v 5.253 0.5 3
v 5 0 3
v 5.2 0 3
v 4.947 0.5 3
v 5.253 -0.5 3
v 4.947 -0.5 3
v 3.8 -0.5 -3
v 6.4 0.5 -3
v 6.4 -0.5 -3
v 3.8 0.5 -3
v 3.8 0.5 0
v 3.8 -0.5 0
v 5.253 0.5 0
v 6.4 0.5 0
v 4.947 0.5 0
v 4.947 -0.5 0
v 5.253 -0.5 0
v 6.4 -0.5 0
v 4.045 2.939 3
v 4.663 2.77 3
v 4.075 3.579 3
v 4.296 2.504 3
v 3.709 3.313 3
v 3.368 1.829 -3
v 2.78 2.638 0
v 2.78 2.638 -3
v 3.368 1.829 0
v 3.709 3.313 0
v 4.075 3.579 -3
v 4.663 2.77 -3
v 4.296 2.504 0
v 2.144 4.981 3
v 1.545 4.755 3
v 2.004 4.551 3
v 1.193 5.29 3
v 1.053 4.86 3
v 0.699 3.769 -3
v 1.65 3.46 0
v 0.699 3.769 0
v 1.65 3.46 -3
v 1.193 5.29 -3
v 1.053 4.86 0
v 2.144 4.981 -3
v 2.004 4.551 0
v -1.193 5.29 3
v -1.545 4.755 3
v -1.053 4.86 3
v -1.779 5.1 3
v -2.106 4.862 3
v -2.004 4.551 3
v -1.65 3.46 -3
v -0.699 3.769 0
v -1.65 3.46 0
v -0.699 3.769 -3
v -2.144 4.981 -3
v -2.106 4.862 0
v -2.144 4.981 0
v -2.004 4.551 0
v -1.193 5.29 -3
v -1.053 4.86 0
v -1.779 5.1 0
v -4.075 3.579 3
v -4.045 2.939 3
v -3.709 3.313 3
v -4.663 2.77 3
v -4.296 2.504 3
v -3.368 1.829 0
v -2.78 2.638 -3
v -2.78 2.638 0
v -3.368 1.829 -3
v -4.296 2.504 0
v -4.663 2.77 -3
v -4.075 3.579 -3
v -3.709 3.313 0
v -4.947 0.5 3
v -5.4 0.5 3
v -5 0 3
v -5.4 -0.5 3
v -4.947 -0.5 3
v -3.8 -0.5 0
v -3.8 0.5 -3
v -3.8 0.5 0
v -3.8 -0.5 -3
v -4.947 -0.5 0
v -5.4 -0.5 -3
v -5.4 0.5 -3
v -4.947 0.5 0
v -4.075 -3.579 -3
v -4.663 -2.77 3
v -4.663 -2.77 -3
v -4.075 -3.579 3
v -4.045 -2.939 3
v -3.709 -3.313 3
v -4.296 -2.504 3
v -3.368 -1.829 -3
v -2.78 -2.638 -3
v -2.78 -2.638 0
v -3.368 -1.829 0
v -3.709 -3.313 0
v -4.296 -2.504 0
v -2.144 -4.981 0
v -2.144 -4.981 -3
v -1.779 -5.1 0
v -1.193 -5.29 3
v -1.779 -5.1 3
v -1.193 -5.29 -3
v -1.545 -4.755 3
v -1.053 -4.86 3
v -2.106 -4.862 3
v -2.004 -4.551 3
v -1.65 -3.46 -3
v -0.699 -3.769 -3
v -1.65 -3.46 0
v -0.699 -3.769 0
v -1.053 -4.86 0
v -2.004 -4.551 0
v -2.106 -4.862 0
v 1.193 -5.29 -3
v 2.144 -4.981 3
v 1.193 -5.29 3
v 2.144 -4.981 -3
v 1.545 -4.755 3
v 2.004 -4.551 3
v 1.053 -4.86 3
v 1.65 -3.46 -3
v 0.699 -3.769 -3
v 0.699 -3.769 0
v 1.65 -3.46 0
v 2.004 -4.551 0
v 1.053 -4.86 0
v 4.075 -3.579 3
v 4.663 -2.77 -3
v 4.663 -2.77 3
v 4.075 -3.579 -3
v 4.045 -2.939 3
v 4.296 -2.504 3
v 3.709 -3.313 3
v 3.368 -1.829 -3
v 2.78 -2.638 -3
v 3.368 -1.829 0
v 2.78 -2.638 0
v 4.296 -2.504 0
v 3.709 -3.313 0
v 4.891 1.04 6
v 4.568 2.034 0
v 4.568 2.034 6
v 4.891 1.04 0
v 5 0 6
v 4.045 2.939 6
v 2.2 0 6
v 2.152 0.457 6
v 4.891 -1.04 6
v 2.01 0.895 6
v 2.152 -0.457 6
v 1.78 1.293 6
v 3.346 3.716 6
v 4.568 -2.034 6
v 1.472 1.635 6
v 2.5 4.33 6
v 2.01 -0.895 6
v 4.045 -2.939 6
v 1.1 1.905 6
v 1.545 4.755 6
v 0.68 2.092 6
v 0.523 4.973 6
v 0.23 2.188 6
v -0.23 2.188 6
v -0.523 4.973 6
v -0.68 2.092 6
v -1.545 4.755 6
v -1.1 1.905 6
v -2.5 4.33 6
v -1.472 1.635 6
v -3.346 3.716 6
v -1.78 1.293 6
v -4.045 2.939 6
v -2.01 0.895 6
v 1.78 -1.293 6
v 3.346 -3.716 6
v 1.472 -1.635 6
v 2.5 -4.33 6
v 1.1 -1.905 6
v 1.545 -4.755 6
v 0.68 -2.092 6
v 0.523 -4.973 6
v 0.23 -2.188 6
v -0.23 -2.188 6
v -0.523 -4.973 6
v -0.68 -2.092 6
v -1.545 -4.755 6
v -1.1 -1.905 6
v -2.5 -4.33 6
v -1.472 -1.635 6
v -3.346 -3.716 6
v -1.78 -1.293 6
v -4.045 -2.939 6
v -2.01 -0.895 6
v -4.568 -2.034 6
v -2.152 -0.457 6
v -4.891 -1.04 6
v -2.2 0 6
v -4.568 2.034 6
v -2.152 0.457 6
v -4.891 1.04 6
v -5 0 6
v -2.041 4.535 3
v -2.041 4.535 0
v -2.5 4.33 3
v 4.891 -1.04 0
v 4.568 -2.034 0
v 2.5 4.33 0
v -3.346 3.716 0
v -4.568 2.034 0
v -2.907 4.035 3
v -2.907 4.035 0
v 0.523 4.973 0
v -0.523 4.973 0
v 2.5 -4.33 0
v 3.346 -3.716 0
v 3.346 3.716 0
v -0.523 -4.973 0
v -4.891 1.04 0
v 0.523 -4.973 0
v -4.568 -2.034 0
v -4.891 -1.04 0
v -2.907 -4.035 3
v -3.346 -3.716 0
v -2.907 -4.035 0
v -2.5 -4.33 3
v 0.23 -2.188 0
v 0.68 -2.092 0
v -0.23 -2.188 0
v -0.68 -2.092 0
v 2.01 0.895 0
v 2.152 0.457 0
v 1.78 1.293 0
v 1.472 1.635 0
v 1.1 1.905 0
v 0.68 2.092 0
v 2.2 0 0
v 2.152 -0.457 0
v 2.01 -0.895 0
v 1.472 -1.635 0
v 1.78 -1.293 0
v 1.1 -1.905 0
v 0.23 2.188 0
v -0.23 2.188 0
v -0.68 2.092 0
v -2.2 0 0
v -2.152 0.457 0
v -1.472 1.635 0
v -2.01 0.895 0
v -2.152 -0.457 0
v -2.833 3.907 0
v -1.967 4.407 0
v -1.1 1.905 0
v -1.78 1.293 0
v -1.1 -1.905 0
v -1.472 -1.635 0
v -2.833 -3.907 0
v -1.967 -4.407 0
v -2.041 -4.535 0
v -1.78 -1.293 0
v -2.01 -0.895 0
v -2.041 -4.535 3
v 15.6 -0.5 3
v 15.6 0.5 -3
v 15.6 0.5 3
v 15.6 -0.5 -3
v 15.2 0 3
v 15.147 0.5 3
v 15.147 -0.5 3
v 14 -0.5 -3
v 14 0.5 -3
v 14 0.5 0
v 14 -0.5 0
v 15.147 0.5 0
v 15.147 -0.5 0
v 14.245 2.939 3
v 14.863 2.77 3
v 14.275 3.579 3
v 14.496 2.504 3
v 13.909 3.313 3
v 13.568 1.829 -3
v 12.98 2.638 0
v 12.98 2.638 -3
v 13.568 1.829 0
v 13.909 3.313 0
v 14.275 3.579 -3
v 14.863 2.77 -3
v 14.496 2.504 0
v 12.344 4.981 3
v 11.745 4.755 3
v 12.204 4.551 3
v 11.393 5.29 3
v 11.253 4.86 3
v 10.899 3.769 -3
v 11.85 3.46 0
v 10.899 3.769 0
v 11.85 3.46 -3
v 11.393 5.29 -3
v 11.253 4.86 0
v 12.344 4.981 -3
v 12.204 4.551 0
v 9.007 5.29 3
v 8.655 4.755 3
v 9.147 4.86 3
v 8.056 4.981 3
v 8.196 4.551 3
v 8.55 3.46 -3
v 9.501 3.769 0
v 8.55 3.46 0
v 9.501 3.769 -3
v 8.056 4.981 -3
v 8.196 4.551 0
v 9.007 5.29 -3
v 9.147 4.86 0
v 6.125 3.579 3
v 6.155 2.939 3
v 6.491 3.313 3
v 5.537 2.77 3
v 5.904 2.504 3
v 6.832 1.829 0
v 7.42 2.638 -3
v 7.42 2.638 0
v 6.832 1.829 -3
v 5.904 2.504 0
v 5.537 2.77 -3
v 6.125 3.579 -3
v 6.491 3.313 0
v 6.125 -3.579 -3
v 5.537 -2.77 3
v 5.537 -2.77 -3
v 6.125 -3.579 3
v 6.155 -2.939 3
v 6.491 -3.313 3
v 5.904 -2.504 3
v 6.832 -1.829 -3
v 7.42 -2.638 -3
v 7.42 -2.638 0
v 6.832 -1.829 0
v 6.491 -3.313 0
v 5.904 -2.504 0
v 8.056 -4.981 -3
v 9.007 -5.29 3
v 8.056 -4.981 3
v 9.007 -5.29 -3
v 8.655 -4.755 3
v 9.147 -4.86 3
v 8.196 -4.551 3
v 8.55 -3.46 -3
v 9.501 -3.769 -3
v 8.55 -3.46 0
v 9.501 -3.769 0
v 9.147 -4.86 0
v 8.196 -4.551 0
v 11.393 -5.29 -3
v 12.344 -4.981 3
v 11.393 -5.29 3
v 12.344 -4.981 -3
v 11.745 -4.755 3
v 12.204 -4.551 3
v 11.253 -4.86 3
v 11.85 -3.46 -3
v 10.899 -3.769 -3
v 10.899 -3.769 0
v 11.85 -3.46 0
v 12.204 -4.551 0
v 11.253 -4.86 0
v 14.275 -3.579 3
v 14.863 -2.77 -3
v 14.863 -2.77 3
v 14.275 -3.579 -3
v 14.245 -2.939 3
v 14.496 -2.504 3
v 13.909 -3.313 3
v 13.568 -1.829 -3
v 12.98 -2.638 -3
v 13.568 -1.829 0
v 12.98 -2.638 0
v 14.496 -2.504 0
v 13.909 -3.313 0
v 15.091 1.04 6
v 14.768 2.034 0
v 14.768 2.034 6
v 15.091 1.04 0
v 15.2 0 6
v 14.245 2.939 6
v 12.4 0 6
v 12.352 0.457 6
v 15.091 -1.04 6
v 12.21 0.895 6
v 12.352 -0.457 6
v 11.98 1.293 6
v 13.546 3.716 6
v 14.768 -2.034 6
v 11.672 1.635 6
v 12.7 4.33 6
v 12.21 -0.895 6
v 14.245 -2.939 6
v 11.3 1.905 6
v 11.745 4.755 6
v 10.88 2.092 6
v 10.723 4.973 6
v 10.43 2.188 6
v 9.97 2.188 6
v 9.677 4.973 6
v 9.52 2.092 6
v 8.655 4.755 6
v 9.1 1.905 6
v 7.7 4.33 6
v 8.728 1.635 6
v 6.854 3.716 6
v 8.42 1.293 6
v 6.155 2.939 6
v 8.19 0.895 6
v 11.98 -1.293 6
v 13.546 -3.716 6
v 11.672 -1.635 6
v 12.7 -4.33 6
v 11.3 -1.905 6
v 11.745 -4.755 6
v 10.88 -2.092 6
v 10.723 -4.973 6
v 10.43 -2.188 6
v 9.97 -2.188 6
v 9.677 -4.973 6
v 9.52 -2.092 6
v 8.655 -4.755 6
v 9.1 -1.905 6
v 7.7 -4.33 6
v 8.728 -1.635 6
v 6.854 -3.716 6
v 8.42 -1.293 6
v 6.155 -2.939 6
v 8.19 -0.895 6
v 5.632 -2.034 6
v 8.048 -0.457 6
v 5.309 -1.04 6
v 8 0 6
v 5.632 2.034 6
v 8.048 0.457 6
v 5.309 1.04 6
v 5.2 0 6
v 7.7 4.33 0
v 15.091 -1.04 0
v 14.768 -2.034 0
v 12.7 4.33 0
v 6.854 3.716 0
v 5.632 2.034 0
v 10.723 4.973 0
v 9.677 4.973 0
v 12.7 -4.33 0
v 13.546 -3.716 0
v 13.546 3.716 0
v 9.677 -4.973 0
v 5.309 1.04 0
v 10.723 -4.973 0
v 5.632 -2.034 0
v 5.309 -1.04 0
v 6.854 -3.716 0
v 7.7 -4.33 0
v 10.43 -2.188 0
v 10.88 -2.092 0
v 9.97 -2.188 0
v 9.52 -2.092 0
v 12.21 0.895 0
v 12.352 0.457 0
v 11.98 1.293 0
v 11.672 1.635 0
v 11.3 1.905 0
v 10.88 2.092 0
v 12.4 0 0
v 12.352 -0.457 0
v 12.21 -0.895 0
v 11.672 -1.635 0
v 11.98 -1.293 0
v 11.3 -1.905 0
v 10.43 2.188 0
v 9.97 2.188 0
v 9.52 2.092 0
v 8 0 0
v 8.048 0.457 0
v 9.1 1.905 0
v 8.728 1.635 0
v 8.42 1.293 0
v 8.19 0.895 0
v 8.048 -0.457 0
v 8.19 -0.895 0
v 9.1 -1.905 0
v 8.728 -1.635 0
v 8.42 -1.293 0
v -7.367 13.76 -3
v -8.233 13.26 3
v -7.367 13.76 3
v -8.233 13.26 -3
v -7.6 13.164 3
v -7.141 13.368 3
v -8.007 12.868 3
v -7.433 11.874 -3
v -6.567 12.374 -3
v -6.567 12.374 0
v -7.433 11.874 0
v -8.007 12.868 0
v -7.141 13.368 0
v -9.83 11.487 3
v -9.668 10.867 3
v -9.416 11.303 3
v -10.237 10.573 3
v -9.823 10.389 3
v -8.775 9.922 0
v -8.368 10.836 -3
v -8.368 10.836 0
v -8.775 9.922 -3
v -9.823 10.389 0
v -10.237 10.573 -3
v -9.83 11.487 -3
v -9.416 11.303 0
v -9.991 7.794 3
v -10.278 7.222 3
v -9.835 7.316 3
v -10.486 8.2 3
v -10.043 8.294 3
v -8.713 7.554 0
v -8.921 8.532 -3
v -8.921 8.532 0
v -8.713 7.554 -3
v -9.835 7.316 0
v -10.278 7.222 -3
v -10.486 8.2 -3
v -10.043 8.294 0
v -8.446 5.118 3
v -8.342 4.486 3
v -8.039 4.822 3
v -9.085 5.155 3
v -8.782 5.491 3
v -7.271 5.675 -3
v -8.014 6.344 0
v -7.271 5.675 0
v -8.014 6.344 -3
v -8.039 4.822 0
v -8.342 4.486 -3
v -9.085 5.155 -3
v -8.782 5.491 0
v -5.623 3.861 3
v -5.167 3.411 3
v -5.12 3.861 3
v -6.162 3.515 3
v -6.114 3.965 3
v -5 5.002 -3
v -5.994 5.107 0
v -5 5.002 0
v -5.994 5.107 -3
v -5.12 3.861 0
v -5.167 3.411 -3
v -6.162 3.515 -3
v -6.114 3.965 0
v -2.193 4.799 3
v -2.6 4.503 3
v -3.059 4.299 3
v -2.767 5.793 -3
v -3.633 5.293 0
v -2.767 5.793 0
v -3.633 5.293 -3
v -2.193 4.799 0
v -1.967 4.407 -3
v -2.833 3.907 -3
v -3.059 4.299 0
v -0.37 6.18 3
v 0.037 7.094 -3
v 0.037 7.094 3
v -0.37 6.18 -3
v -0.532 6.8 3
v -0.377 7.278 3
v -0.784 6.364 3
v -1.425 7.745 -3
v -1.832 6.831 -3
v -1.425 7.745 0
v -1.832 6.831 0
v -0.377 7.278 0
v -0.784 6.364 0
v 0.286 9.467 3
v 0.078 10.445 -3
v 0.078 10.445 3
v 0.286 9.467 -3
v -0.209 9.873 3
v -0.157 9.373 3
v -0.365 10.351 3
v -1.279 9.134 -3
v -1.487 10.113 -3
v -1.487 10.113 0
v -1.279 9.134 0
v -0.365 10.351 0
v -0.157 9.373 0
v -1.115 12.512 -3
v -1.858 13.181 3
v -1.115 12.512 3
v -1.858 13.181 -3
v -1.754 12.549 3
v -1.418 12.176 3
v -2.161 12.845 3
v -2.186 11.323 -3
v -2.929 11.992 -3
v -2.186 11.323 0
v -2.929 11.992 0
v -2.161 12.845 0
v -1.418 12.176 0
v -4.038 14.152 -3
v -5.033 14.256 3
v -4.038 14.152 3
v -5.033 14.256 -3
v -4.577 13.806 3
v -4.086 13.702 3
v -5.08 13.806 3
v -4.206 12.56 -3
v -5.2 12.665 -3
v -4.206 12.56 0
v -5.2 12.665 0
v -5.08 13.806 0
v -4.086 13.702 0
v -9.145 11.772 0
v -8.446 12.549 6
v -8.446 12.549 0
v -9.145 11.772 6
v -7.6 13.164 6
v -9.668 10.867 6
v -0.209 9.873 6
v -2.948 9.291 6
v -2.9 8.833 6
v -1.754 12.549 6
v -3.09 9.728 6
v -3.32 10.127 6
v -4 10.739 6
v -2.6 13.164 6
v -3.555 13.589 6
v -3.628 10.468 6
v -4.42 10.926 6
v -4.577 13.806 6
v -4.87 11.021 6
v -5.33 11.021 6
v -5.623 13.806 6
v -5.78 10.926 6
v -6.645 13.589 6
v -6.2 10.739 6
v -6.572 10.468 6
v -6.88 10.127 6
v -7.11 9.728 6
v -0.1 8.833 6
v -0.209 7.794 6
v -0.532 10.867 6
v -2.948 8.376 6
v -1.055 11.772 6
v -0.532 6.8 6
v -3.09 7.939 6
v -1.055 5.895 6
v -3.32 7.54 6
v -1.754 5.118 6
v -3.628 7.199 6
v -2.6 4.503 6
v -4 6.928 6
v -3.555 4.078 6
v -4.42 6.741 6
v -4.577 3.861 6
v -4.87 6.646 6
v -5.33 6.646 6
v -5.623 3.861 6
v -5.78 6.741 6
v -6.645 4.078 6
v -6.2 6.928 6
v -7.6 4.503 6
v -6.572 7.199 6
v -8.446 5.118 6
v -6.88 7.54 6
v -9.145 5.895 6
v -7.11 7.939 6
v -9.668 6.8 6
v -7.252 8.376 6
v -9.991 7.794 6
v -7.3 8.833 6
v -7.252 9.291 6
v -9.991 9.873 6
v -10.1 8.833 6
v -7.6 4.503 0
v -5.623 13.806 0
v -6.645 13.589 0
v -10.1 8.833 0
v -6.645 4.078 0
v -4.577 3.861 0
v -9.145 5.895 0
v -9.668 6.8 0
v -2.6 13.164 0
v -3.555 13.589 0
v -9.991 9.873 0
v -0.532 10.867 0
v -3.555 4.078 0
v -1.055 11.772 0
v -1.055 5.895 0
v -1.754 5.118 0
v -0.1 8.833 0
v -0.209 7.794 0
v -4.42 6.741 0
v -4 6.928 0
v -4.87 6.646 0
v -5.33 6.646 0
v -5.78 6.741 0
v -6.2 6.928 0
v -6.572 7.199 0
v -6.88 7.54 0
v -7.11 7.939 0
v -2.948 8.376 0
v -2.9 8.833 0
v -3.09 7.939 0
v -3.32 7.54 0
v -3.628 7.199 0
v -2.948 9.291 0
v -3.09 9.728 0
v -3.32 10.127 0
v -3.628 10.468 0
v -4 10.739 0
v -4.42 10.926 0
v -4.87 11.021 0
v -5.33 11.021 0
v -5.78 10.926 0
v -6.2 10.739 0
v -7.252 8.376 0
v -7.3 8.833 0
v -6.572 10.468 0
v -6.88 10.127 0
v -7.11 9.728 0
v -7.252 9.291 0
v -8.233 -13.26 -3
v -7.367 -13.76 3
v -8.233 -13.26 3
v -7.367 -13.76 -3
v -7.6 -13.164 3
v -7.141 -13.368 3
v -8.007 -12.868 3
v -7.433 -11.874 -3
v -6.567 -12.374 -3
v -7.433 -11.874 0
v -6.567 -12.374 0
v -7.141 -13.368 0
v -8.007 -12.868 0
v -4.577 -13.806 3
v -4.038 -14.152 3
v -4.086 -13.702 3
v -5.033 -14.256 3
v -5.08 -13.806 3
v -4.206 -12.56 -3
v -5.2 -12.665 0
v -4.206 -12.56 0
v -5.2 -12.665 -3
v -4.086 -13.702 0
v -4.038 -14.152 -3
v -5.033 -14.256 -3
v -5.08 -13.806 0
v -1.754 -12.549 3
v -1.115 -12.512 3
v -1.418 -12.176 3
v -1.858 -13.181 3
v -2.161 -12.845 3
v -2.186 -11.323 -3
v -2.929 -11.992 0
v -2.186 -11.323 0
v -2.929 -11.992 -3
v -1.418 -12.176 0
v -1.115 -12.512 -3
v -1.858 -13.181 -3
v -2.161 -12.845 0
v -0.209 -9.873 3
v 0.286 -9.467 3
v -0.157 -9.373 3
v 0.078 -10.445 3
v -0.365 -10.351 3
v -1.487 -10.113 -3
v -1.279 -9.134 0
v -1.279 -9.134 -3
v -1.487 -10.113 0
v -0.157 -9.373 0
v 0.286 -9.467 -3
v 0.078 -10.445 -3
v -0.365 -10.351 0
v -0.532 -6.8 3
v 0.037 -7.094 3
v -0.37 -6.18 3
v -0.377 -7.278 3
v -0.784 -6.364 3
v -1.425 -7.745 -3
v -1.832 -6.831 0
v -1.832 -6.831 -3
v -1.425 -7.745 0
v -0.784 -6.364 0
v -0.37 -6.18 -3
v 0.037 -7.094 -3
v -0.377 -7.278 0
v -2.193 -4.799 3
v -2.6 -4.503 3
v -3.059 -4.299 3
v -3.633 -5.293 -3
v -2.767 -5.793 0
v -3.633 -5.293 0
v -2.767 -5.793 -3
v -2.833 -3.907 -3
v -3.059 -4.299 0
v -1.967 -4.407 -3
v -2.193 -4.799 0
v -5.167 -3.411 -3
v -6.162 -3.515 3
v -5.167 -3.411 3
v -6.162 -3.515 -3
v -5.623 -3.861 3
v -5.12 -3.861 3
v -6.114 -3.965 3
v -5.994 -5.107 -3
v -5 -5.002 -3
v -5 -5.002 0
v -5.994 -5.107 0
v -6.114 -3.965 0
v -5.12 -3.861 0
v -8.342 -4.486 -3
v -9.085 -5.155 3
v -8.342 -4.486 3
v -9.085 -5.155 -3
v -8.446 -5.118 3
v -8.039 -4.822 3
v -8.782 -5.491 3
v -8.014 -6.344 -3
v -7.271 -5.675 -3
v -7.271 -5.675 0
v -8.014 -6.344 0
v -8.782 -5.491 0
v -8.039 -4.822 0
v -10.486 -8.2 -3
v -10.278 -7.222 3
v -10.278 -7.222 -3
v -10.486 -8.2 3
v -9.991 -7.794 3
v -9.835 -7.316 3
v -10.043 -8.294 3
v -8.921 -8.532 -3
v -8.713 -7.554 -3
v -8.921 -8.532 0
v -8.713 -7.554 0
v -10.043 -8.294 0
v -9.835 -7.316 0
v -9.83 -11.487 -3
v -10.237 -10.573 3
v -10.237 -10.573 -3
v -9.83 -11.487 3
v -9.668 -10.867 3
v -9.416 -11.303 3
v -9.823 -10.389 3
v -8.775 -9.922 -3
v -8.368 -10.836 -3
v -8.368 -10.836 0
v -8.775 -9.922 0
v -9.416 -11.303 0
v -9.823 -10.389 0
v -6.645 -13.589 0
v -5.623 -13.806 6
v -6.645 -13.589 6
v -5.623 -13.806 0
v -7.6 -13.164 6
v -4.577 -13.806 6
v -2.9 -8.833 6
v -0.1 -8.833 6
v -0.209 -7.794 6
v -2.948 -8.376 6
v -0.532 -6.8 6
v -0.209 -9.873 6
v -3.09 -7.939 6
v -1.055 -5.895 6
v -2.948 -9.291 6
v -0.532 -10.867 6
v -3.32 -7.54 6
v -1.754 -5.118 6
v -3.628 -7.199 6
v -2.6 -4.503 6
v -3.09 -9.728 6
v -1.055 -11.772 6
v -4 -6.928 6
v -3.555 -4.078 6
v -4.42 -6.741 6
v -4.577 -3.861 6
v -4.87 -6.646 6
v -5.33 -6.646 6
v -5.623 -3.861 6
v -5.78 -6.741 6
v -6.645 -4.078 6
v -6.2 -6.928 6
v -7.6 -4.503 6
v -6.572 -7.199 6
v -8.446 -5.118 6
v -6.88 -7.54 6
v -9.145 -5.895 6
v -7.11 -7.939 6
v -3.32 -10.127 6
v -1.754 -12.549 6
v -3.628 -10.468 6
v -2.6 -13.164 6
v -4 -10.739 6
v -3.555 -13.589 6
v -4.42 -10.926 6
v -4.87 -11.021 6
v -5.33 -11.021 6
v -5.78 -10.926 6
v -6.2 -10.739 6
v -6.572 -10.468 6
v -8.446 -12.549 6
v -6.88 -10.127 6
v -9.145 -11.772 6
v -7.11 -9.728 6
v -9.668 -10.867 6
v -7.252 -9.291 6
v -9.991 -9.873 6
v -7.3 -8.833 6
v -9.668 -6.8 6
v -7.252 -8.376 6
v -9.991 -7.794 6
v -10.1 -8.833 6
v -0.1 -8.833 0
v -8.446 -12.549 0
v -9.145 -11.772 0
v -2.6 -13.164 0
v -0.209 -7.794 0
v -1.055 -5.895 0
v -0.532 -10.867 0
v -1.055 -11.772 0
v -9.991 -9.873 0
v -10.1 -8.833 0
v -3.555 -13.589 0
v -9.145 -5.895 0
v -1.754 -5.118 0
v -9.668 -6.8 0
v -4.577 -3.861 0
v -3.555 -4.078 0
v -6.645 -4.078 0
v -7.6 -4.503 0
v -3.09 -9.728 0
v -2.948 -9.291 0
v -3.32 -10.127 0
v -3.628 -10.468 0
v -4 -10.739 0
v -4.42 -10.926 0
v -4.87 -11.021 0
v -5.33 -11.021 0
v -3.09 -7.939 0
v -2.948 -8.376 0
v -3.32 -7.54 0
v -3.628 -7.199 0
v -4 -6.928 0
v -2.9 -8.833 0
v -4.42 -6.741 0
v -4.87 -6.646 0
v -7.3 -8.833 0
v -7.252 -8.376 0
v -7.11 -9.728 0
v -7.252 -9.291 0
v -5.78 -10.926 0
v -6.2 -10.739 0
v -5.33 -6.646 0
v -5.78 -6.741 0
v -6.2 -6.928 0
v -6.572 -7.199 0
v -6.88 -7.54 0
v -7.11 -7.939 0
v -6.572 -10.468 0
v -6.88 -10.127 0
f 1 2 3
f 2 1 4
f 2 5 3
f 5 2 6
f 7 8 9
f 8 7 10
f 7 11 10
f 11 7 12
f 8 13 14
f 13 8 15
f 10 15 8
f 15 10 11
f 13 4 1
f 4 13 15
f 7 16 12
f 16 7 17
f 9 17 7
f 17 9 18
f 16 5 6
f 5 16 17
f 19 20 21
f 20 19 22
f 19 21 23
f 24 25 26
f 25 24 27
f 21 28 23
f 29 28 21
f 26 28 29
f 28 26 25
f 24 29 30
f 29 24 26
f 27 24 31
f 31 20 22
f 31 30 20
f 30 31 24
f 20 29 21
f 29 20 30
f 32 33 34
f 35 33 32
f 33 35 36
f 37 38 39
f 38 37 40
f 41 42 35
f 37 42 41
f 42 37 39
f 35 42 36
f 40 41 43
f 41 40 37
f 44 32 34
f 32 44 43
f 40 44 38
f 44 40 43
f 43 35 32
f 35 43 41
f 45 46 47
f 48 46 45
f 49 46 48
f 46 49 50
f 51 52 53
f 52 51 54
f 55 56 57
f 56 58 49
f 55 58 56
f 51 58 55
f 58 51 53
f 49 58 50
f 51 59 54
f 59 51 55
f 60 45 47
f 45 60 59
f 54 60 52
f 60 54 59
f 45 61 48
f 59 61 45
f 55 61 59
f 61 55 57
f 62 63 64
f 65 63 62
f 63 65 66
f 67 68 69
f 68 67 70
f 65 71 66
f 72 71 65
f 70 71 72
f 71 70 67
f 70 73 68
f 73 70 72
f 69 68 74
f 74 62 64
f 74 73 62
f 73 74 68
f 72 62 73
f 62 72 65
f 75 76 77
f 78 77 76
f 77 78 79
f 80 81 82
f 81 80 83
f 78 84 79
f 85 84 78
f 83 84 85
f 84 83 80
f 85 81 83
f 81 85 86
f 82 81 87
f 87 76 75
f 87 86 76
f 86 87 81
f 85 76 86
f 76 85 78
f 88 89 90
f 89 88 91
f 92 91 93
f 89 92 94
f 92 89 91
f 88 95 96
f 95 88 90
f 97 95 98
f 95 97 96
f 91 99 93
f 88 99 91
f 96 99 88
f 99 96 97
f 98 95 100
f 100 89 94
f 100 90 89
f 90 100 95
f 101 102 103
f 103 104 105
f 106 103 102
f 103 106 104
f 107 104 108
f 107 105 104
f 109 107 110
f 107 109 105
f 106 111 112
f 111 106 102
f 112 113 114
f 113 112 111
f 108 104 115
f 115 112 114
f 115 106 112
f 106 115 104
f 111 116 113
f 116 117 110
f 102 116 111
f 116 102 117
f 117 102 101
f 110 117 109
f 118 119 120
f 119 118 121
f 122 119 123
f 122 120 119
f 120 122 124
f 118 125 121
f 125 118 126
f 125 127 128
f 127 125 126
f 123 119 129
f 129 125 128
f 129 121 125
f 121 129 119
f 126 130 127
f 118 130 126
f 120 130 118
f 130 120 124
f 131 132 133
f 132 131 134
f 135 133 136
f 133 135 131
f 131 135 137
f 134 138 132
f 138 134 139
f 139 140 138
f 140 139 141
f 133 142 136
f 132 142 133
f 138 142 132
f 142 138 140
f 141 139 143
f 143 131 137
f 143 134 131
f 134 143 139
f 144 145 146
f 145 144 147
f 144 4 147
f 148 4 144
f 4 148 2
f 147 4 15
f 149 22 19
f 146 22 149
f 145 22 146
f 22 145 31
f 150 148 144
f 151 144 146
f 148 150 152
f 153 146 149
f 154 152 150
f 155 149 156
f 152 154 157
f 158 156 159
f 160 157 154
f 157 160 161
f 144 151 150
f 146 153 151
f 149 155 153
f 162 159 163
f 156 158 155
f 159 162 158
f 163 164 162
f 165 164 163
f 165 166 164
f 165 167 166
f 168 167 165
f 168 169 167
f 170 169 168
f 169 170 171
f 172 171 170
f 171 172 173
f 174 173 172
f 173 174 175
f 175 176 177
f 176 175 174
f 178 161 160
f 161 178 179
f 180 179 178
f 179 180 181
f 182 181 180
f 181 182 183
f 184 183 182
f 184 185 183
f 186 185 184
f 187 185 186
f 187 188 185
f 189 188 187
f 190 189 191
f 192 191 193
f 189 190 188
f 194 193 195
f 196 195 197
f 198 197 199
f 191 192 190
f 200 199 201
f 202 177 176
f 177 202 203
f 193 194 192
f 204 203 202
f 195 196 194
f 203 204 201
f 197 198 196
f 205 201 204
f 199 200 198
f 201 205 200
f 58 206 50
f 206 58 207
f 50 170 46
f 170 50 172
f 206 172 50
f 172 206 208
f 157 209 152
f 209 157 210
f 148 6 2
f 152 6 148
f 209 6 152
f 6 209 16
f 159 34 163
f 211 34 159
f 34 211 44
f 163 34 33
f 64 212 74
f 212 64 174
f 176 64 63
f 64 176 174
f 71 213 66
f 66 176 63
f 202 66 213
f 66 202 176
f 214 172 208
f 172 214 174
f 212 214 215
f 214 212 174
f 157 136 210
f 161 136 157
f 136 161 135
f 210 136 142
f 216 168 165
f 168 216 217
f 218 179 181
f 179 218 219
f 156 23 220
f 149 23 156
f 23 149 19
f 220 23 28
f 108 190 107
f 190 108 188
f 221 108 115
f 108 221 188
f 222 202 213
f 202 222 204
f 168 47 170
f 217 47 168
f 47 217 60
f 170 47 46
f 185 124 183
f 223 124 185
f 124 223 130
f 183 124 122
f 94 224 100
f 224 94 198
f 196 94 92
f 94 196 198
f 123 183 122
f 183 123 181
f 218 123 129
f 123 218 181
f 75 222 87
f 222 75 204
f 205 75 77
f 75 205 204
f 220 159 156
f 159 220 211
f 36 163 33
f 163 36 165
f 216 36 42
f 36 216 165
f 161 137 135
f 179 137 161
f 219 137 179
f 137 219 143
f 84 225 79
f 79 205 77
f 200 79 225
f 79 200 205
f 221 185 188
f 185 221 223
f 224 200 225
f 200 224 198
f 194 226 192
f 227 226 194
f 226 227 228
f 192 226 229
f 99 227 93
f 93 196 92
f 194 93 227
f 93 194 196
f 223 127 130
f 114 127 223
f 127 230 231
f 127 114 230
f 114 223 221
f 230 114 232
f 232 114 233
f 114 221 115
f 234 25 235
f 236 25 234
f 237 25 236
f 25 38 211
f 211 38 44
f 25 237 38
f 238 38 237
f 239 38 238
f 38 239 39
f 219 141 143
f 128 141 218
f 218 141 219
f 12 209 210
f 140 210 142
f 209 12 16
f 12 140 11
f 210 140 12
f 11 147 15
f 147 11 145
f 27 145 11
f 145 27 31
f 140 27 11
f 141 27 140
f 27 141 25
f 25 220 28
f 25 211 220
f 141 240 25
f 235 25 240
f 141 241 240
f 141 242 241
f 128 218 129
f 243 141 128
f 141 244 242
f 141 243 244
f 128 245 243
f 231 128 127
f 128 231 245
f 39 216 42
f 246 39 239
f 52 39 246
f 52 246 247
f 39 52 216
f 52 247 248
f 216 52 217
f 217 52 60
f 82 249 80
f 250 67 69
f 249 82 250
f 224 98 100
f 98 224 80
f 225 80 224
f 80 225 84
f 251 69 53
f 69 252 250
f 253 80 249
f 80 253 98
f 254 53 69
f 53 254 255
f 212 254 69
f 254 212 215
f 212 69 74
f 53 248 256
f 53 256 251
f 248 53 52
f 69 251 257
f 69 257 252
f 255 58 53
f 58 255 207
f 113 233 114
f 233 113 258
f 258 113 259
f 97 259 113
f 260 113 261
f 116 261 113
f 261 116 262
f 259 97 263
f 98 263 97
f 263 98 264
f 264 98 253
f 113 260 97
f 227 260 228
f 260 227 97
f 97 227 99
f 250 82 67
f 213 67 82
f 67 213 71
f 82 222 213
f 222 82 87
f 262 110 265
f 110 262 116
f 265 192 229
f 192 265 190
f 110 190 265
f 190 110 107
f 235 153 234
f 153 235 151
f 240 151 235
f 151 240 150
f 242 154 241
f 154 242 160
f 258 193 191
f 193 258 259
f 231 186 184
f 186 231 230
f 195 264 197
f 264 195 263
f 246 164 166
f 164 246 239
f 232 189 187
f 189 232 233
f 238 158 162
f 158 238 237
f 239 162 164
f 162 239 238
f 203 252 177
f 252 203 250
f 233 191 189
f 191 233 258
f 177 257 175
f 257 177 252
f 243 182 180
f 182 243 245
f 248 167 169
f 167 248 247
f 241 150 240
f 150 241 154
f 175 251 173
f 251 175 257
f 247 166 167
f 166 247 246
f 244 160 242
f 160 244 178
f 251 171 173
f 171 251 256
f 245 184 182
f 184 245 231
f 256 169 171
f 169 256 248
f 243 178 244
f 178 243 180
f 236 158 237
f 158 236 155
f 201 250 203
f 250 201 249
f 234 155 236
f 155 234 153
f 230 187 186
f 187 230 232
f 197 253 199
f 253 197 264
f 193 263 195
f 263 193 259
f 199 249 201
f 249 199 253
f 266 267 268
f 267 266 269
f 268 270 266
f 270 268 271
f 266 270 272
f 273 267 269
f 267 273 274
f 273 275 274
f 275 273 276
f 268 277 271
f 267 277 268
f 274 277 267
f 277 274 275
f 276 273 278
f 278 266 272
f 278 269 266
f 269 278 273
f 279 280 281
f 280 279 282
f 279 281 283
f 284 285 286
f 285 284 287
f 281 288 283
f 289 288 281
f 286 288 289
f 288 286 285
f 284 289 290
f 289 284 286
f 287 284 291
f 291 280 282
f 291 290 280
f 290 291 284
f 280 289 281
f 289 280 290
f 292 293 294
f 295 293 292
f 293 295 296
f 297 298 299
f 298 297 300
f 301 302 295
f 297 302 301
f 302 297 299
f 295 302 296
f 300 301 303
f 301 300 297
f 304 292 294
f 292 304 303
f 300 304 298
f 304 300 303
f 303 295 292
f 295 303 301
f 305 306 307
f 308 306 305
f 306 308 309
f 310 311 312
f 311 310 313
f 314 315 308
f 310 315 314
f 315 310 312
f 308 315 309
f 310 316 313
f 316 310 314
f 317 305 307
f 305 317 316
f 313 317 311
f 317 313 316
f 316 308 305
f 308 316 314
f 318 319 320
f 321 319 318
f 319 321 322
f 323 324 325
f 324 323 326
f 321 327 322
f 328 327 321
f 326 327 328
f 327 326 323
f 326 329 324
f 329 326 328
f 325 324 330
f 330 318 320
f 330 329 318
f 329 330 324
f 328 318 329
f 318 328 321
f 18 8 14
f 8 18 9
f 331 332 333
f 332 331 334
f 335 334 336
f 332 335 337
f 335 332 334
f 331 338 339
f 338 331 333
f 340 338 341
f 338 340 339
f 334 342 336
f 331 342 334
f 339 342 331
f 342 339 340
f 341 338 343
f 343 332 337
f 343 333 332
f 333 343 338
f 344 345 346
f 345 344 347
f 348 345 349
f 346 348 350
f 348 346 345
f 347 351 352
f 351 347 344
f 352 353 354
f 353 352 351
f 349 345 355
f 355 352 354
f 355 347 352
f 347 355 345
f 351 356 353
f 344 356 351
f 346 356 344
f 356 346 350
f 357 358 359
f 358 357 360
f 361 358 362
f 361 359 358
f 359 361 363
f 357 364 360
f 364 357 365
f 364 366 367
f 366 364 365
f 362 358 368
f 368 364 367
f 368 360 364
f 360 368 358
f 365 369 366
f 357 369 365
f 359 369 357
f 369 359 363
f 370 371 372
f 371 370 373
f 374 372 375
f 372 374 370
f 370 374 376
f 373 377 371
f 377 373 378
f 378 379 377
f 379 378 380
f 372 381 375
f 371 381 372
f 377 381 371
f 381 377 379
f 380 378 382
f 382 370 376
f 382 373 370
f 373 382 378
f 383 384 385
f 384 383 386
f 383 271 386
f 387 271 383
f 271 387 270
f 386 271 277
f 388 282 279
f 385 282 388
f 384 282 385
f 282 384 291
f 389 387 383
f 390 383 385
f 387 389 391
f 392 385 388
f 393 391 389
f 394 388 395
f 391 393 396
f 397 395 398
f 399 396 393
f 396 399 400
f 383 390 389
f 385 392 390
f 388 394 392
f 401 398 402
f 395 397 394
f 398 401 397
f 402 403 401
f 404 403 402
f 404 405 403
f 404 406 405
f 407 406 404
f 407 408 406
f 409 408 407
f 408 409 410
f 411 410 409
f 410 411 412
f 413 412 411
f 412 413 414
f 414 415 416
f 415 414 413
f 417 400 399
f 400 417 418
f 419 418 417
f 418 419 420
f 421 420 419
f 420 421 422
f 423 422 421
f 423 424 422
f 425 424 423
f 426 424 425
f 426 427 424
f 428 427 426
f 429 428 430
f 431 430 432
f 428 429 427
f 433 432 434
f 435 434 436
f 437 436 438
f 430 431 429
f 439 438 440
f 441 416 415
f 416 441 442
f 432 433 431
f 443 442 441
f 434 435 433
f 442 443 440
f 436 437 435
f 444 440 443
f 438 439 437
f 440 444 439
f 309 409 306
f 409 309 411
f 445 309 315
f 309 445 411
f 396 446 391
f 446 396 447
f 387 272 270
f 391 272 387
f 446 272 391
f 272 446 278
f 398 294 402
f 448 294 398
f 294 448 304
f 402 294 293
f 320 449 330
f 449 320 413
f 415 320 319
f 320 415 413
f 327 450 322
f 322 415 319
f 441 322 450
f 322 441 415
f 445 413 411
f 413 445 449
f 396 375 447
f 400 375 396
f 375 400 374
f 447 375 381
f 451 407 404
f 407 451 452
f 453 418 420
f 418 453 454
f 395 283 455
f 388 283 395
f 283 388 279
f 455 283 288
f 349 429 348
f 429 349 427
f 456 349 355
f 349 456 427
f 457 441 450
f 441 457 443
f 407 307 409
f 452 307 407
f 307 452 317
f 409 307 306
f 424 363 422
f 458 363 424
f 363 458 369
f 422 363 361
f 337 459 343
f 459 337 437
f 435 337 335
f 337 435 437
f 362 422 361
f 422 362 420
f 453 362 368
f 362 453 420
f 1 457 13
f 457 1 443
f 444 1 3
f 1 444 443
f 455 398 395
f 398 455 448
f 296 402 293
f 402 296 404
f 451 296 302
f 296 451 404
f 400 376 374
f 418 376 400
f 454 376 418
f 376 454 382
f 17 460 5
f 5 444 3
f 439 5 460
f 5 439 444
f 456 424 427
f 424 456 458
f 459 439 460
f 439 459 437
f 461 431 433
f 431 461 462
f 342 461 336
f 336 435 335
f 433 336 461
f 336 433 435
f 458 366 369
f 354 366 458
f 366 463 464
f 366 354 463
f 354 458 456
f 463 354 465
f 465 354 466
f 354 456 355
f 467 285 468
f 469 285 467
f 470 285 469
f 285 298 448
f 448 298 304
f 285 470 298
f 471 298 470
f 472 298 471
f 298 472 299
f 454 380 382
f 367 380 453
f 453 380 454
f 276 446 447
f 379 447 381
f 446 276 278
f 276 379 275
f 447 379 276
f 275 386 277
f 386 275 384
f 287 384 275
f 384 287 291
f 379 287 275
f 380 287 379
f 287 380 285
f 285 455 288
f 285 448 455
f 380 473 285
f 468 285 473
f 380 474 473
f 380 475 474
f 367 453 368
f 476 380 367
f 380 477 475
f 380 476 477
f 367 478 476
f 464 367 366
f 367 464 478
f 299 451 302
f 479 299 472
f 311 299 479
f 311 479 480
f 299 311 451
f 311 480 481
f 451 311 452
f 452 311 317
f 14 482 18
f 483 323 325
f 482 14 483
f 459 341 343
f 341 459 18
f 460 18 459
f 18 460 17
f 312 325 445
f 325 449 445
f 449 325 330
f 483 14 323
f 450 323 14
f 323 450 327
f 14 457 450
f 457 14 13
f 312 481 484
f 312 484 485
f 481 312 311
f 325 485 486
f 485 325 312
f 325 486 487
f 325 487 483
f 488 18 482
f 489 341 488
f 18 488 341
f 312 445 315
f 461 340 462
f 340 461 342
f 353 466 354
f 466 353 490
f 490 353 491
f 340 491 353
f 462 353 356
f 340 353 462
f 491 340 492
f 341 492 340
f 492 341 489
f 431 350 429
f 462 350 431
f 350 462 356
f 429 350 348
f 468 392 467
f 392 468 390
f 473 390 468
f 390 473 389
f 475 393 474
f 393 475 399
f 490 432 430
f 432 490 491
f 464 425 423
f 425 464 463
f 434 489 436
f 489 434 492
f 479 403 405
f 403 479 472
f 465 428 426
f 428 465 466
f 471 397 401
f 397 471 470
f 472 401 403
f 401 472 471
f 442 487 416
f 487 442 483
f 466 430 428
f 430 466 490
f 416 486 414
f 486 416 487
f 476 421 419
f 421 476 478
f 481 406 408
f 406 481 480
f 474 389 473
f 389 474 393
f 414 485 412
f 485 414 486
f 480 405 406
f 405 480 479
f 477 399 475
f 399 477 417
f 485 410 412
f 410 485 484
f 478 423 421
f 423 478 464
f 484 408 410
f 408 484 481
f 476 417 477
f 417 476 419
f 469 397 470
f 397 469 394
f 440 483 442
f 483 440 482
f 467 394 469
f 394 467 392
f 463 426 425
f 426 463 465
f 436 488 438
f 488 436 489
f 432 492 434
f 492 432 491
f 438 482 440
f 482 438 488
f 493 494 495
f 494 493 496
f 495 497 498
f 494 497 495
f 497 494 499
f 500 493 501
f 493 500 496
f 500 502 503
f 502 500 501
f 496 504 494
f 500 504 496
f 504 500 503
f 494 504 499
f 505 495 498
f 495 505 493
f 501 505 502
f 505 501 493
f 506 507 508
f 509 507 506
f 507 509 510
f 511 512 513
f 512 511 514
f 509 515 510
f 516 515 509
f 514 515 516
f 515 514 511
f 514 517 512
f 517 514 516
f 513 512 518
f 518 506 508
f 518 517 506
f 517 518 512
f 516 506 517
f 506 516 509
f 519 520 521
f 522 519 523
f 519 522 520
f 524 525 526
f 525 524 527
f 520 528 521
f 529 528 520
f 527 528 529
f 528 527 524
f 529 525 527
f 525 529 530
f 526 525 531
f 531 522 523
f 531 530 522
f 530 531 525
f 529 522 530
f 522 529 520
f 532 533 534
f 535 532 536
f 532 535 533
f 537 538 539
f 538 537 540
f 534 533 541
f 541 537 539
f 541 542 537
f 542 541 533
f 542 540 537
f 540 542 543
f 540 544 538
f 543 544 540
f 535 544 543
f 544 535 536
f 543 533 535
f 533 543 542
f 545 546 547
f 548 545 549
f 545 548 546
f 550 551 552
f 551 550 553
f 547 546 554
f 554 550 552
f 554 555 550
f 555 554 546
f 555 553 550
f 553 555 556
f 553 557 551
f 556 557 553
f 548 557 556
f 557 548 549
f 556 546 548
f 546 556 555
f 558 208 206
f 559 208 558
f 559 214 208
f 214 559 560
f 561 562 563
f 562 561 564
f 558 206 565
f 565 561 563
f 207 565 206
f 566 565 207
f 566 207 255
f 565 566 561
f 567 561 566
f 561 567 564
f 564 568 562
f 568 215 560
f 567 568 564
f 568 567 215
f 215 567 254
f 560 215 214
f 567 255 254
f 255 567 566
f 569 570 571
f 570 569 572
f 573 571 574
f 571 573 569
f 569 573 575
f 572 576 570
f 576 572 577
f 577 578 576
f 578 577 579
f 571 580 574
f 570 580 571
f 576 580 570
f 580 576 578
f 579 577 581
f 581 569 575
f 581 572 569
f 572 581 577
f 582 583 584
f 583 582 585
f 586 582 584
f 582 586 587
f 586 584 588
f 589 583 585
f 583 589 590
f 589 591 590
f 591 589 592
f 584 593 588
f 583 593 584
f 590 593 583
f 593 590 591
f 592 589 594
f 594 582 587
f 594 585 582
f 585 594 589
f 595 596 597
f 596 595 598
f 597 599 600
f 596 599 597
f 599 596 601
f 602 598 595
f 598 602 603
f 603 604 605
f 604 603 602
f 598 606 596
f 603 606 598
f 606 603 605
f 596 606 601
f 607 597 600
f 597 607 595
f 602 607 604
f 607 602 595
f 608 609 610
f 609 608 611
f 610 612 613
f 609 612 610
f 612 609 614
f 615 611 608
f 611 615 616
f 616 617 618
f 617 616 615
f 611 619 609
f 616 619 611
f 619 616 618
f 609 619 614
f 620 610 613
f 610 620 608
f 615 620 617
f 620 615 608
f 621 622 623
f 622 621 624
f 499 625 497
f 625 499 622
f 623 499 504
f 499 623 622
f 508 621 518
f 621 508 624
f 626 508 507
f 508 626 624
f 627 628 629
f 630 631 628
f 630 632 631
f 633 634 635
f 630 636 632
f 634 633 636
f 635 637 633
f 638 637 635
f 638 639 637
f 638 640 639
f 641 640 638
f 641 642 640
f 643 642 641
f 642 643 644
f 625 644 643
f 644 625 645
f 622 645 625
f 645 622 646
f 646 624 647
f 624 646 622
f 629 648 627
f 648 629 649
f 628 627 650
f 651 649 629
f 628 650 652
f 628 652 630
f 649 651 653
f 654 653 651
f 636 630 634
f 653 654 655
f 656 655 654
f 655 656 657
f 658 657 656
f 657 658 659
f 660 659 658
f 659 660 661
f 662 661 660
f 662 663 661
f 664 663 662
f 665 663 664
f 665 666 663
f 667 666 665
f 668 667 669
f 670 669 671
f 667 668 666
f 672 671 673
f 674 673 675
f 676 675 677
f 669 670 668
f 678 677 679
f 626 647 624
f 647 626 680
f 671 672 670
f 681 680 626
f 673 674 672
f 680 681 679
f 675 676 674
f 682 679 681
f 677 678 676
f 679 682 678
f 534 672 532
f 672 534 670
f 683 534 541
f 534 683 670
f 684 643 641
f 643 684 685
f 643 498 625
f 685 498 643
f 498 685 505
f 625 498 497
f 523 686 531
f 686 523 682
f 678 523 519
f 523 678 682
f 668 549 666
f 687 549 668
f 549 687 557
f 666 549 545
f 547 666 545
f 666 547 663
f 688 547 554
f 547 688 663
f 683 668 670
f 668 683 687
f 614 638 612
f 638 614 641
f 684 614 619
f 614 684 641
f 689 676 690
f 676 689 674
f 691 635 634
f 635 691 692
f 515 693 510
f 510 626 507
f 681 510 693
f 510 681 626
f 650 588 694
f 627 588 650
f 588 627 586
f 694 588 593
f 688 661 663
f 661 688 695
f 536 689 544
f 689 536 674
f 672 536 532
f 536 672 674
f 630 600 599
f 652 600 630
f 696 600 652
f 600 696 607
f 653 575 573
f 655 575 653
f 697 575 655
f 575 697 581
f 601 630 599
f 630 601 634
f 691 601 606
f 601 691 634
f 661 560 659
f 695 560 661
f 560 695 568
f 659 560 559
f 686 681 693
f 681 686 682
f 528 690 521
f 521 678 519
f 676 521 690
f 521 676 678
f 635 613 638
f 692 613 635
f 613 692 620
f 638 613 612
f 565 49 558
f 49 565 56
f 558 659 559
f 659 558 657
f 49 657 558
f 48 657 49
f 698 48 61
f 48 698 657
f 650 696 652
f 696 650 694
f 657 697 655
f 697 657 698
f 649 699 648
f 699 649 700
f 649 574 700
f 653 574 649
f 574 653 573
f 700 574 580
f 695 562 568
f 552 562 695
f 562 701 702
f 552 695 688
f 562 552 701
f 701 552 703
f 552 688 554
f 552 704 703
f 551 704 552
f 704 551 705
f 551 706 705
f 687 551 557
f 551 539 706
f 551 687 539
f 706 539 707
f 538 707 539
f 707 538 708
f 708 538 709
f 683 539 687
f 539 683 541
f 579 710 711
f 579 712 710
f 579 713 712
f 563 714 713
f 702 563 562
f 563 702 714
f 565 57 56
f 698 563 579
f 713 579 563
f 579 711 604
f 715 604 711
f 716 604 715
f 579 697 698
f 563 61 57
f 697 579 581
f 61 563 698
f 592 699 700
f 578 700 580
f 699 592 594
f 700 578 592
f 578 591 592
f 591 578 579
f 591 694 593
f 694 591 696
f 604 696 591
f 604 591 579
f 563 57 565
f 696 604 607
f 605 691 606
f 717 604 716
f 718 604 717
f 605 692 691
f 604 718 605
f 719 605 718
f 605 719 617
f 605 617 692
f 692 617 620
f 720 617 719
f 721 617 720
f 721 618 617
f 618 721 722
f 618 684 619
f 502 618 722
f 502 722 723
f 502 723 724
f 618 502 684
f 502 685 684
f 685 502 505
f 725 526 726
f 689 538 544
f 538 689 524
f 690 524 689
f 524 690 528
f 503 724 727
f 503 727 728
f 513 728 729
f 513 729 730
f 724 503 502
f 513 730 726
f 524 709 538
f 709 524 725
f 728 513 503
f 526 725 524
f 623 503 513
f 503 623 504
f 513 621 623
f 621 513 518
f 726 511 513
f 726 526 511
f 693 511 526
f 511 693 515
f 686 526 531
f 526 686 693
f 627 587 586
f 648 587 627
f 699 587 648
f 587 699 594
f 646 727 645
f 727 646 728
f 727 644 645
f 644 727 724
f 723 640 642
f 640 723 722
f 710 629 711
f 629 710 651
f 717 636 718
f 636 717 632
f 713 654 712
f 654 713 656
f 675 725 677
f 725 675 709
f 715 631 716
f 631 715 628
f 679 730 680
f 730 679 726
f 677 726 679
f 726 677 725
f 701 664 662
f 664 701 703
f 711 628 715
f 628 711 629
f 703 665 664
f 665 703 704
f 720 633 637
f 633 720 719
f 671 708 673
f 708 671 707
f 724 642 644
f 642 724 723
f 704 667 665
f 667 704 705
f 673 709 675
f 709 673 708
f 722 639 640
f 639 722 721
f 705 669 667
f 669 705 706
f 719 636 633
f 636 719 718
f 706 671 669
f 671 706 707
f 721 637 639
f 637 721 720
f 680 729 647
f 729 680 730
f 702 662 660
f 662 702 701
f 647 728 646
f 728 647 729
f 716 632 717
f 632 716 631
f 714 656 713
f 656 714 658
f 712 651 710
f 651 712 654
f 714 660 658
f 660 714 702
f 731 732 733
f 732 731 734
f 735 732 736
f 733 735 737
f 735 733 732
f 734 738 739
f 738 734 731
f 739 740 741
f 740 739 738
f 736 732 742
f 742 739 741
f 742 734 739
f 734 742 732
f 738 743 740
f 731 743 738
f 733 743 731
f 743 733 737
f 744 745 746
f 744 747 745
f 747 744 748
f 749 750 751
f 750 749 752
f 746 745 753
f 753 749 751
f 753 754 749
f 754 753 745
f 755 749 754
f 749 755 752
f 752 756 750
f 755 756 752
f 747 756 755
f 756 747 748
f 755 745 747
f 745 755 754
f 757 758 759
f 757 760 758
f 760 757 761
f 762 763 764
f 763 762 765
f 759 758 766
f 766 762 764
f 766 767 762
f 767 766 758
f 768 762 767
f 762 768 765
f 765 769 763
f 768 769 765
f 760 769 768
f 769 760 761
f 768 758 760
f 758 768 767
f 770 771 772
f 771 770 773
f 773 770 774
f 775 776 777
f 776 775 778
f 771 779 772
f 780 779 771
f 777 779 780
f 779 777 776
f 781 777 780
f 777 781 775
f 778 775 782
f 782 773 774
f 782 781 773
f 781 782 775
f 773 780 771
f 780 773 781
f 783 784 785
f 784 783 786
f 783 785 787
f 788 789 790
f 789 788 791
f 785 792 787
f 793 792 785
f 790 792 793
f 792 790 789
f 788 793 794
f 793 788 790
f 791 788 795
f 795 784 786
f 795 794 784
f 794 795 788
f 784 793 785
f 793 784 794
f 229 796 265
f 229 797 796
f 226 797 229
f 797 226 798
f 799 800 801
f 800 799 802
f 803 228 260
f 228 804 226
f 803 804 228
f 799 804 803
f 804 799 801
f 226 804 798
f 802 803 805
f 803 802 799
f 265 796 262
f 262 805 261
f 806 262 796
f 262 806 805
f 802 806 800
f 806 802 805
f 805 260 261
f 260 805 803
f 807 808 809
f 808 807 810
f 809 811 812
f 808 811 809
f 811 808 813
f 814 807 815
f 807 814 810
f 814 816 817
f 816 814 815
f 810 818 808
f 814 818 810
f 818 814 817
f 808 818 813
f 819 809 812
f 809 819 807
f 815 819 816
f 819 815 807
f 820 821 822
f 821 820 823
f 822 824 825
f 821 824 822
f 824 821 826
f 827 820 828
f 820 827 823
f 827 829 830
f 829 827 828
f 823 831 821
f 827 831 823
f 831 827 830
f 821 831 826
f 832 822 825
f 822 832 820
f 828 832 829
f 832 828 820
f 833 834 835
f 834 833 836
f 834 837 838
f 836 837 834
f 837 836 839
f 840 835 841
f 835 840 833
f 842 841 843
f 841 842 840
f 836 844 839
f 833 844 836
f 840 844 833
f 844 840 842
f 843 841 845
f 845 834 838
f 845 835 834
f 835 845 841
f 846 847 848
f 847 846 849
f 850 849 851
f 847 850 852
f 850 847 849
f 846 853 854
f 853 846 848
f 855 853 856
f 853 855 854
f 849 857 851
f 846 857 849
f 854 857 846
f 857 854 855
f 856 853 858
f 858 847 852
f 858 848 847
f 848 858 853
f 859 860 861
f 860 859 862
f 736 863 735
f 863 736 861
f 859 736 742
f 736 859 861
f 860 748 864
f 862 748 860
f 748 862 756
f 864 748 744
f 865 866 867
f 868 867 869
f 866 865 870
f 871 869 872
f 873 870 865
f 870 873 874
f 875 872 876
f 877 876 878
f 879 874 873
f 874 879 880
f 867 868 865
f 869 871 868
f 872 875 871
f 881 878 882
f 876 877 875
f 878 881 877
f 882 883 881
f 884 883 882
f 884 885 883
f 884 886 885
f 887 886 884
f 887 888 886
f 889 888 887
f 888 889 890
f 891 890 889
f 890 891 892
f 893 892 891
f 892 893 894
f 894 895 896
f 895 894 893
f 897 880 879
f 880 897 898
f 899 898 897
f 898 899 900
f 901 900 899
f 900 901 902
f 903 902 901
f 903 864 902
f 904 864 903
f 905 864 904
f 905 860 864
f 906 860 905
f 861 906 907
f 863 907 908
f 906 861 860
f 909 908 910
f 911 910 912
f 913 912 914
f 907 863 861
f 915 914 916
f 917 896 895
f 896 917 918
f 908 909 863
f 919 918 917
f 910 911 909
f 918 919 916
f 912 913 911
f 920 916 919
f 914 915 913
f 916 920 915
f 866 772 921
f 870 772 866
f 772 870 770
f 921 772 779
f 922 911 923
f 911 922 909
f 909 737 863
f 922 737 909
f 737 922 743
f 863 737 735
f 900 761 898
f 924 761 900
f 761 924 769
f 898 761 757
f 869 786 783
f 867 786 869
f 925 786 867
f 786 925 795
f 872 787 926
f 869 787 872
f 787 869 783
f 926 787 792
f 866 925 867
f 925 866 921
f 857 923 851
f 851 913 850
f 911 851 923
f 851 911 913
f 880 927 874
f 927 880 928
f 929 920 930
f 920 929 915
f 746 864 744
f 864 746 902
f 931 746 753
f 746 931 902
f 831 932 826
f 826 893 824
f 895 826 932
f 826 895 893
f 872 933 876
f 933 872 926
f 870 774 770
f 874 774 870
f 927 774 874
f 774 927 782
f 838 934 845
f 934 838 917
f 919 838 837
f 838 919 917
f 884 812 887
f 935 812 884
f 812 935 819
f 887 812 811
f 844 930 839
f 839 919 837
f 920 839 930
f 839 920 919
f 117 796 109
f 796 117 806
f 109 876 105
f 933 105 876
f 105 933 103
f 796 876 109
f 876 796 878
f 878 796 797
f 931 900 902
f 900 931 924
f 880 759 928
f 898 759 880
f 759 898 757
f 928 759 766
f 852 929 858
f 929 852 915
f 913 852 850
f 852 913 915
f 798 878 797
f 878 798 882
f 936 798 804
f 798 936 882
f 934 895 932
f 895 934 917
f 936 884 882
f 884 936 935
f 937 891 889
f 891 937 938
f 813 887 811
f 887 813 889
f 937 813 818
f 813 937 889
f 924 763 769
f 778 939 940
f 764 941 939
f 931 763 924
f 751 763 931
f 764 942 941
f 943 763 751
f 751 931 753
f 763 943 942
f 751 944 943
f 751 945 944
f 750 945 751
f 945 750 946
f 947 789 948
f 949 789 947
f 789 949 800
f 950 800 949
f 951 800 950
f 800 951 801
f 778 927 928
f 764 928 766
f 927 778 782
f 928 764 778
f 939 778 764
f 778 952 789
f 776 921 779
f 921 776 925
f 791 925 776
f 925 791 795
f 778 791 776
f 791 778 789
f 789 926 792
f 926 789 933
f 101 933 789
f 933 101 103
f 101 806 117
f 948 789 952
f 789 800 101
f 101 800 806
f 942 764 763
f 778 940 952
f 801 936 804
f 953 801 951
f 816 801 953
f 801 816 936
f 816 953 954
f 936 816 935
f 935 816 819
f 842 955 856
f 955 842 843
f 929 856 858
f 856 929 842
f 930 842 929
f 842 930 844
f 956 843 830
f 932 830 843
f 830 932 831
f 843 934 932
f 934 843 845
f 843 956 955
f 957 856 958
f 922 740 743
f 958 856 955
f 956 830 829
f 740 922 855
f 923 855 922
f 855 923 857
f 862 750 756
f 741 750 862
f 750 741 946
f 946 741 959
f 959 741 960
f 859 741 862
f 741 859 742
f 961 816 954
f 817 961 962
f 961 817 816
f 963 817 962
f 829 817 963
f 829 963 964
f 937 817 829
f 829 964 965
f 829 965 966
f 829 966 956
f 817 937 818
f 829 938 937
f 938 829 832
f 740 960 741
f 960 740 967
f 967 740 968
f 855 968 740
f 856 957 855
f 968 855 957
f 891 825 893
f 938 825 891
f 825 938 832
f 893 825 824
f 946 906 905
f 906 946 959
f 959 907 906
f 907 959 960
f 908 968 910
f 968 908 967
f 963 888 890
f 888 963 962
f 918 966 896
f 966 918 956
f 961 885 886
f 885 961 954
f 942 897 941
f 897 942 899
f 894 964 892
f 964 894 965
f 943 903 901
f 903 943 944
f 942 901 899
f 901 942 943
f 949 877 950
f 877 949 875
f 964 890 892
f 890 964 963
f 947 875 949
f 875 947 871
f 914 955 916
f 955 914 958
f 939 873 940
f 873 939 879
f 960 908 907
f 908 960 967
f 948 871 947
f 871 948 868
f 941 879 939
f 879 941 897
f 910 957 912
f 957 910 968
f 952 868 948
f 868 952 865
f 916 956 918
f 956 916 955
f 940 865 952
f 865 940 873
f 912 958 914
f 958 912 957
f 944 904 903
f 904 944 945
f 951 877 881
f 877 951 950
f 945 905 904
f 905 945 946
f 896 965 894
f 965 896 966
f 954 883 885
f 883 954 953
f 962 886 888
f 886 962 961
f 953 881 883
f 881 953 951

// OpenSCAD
// Isolate just the inner cogs (Sun + 3 Planet gears) from pip_gear_module.scad

gear_thickness = 6;
pip_gap = 0.2;
r_sun = 5.0;
r_planet = 5.0;
center_dist = r_sun + r_planet + pip_gap;

module simple_gear(teeth, r_pitch) {
    union() {
        cylinder(h=gear_thickness, r=r_pitch, $fn=30);
        for (i = [0 : teeth - 1]) {
            rotate([0, 0, i * (360 / teeth)])
                translate([r_pitch - 0.4, 0, 0])
                    cube([1.6, 1.0, gear_thickness], center=true);
        }
    }
}

module only_cogs() {
    // Central Sun Gear
    difference() {
        simple_gear(10, r_sun);
        cylinder(h=gear_thickness + 2, r=2.0 + pip_gap, $fn=30);
    }

    // Planet Gears
    for (i = [0 : 2]) {
        rotate([0, 0, i * 120])
            translate([center_dist, 0, 0])
            difference() {
                simple_gear(10, r_planet);
                cylinder(h=gear_thickness + 2, r=2.0 + pip_gap, $fn=30);
            }
    }
}

only_cogs();
